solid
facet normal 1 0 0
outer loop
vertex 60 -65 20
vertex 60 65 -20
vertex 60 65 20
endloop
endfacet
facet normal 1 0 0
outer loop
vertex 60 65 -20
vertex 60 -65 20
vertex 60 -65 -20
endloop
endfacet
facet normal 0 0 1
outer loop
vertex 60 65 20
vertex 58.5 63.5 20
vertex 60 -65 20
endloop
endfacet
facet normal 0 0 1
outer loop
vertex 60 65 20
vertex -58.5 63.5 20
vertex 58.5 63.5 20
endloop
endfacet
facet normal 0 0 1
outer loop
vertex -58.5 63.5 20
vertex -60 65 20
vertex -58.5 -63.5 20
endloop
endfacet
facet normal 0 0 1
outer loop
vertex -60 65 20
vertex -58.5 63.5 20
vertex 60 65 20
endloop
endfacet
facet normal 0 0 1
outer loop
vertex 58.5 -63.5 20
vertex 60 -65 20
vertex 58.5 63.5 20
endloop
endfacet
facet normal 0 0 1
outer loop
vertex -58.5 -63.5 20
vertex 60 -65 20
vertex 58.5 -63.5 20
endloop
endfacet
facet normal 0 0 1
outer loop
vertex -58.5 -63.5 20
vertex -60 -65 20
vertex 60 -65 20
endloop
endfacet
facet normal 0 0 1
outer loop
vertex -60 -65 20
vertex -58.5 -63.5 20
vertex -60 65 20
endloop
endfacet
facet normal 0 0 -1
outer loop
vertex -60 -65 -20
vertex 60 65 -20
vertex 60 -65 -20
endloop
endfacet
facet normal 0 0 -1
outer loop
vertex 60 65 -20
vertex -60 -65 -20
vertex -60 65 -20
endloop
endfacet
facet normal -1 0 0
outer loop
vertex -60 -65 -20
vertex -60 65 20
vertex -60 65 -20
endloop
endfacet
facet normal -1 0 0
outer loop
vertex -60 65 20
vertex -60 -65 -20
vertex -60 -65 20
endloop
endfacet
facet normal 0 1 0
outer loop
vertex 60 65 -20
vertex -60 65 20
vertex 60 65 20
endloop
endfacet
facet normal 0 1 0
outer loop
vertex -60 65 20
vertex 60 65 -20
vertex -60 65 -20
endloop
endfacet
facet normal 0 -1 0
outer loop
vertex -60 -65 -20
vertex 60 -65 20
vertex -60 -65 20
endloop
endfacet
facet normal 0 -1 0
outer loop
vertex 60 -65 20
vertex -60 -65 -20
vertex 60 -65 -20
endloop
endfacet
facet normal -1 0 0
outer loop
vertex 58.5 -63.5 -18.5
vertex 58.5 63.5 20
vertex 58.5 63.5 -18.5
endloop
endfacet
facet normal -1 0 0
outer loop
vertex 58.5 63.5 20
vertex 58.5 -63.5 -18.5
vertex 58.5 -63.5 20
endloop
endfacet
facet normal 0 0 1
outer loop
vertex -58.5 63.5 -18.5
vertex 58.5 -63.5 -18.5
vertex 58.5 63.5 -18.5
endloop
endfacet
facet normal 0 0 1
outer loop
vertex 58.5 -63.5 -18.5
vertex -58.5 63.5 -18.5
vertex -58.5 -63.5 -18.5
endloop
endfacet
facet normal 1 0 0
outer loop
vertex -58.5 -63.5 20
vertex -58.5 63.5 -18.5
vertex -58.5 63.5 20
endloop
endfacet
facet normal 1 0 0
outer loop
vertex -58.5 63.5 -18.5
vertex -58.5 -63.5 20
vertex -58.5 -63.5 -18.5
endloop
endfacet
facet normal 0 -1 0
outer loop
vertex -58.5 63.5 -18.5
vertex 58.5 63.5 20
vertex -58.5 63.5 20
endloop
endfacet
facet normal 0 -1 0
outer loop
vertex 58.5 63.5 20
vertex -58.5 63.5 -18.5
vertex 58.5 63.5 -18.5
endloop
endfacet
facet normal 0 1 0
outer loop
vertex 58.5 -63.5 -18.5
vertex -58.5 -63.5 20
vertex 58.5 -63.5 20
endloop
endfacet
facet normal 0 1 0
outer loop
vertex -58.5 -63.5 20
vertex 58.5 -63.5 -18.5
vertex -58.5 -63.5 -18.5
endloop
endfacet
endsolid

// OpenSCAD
// ========================================
// a 120 x 130 x 40 mm enclosure with 1.5 mm wall thickness
// NeuroCAD canonical IR; dimensions are millimetres
// ========================================
$fn = 48;

difference() {
  cube(size=[120, 130, 40], center=true);
  translate([0, 0, 0.85]) {
    cube(size=[117, 127, 38.7], center=true);
  }
}
